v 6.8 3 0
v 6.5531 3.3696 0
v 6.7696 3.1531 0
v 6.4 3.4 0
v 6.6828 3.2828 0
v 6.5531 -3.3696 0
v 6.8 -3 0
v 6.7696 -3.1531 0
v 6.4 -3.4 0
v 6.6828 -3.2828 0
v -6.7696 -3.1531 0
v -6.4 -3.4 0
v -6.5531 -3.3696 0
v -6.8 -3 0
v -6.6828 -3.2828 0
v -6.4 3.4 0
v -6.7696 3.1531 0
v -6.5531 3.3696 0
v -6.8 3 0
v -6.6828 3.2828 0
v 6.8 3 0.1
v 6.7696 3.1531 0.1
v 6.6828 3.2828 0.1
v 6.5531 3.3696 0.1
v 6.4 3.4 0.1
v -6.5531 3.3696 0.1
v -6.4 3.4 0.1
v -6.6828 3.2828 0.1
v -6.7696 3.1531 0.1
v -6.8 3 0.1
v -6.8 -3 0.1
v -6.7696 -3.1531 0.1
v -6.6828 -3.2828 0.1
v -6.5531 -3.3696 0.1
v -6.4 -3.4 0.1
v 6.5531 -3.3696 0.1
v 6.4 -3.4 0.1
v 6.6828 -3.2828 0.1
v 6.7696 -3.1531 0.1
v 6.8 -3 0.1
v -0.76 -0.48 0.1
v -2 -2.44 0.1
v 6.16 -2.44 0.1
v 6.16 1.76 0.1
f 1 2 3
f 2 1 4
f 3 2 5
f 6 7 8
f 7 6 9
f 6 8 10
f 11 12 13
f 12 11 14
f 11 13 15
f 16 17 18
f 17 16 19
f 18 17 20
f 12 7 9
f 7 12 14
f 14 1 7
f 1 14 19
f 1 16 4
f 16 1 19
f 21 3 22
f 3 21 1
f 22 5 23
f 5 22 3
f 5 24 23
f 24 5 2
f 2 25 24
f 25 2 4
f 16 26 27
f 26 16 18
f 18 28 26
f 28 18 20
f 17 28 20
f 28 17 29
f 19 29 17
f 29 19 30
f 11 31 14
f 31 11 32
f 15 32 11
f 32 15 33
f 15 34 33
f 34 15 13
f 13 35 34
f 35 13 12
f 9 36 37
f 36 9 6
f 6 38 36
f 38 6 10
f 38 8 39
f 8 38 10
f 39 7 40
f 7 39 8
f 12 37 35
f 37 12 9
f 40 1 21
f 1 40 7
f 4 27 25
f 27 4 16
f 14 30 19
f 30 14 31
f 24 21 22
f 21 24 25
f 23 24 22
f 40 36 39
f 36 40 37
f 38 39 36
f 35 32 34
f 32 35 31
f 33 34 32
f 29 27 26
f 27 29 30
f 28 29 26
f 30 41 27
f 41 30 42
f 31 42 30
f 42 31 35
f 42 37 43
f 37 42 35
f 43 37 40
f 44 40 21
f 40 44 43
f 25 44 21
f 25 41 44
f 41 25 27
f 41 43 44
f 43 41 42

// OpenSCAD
// file: ../p/1-4cyli.scad
use <../lib.scad>
function ldraw_lib__1_4cyli() = [
// 0 Cylinder 0.25
// 0 Name: 1-4cyli.dat
// 0 Author: James Jessiman
// 0 !LDRAW_ORG Primitive UPDATE 2012-01
// 0 !LICENSE Licensed under CC BY 4.0 : see CAreadme.txt
// 
// 0 BFC CERTIFY CCW
  [0,"BFC","CERTIFY"],
  [0,"BFC","CCW"],
// 
// 0 !HISTORY 2002-03-23 [sbliss] Added BFC statement.
// 0 !HISTORY 2002-04-25 [PTadmin] Official Update 2002-02
// 0 !HISTORY 2007-06-22 [PTadmin] Header formatted for Contributor Agreement
// 0 !HISTORY 2008-07-01 [PTadmin] Official Update 2008-01
// 0 !HISTORY 2012-02-16 [Philo] Changed to CCW
// 0 !HISTORY 2012-03-30 [PTadmin] Official Update 2012-01
// 
// 
// 4 16 1 1 0 0.9239 1 0.3827 0.9239 0 0.3827 1 0 0
  [4,16,1,1,0,0.9239,1,0.3827,0.9239,0,0.3827,1,0,0],
// 5 24 1 0 0 1 1 0 0.9239 0 0.3827 1 0 -1
  [5,24,1,0,0,1,1,0,0.9239,0,0.3827,1,0,-1],
// 4 16 0.9239 1 0.3827 0.7071 1 0.7071 0.7071 0 0.7071 0.9239 0 0.3827
  [4,16,0.9239,1,0.3827,0.7071,1,0.7071,0.7071,0,0.7071,0.9239,0,0.3827],
// 5 24 0.9239 0 0.3827 0.9239 1 0.3827 0.7071 0 0.7071 1 0 0
  [5,24,0.9239,0,0.3827,0.9239,1,0.3827,0.7071,0,0.7071,1,0,0],
// 4 16 0.7071 1 0.7071 0.3827 1 0.9239 0.3827 0 0.9239 0.7071 0 0.7071
  [4,16,0.7071,1,0.7071,0.3827,1,0.9239,0.3827,0,0.9239,0.7071,0,0.7071],
// 5 24 0.7071 0 0.7071 0.7071 1 0.7071 0.3827 0 0.9239 0.9239 0 0.3827
  [5,24,0.7071,0,0.7071,0.7071,1,0.7071,0.3827,0,0.9239,0.9239,0,0.3827],
// 4 16 0.3827 1 0.9239 0 1 1 0 0 1 0.3827 0 0.9239
  [4,16,0.3827,1,0.9239,0,1,1,0,0,1,0.3827,0,0.9239],
// 5 24 0.3827 0 0.9239 0.3827 1 0.9239 0 0 1 0.7071 0 0.7071
  [5,24,0.3827,0,0.9239,0.3827,1,0.9239,0,0,1,0.7071,0,0.7071],
// 5 24 0 0 1 0 1 1 0.3827 0 0.9239 -1 0 1
  [5,24,0,0,1,0,1,1,0.3827,0,0.9239,-1,0,1],
];
module ldraw_lib__1_4cyli(step=0, col=false, unit=2/5, alt=false, line=0.2, solid=!$preview)
    makepoly(ldraw_lib__1_4cyli(), step=step, col=col, unit=unit, alt=alt, line=line, solid=solid);
ldraw_lib__1_4cyli(line=0.2);
// file: ../p/1-4chrd.scad
use <../lib.scad>
function ldraw_lib__1_4chrd() = [
// 0 Chord 0.25
// 0 Name: 1-4chrd.dat
// 0 Author: Max Martin Richter [MMR1988]
// 0 !LDRAW_ORG Primitive UPDATE 2023-05
// 0 !LICENSE Licensed under CC BY 4.0 : see CAreadme.txt
// 
// 0 BFC CERTIFY CCW
  [0,"BFC","CERTIFY"],
  [0,"BFC","CCW"],
// 
// 0 !HISTORY 2004-04-22 [PTadmin] Official Update 2004-02
// 0 !HISTORY 2007-10-09 [PTadmin] Header formatted for Contributor Agreement
// 0 !HISTORY 2008-07-01 [PTadmin] Official Update 2008-01
// 0 !HISTORY 2012-08-02 [MMR1988] Re-creation with PrimGen2 and Rectifier
// 0 !HISTORY 2012-08-09 [PTadmin] Official Update 2012-02
// 0 !HISTORY 2023-10-27 [OrionP] Change author to MMR1988 from hafhead
// 0 !HISTORY 2023-10-31 [OrionP] Official Update 2023-05
// 
// 4 16 0.9239 0 0.3827 0.3827 0 0.9239 0 0 1 1 0 0
  [4,16,0.9239,0,0.3827,0.3827,0,0.9239,0,0,1,1,0,0],
// 3 16 0.7071 0 0.7071 0.3827 0 0.9239 0.9239 0 0.3827
  [3,16,0.7071,0,0.7071,0.3827,0,0.9239,0.9239,0,0.3827],
];
module ldraw_lib__1_4chrd(step=0, col=false, unit=2/5, alt=false, line=0.2, solid=!$preview)
    makepoly(ldraw_lib__1_4chrd(), step=step, col=col, unit=unit, alt=alt, line=line, solid=solid);
ldraw_lib__1_4chrd(line=0.2);
// main file
use <../lib.scad>
use <../p/1-4chrd.scad>
use <../p/1-4cyli.scad>
function ldraw_lib__6347356g() = [
// 0 Sticker  0.8 x  1.7 with Bright Light Orange Trapezoid Short Left
// 0 Name: 6347356g.dat
// 0 Author: Evert-Jan Boer [ejboer]
// 0 !LDRAW_ORG Part UPDATE 2024-06
// 0 !LICENSE Licensed under CC BY 4.0 : see CAreadme.txt
// 
// 0 BFC CERTIFY CCW
  [0,"BFC","CERTIFY"],
  [0,"BFC","CCW"],
// 
// 0 !KEYWORDS Republic Gunship, Set 75309, Star Wars
// 
// 0 !HISTORY 2024-07-29 [OrionP] Official Update 2024-06
// 
// 1 16 16 0 7.5 1 0 0 0 -1 0 0 0 1 1-4chrd.dat
  [1,16,16,0,7.5,1,0,0,0,-1,0,0,0,1, ldraw_lib__1_4chrd()],
// 1 16 16 0 -7.5 0 0 1 0 -1 0 -1 0 0 1-4chrd.dat
  [1,16,16,0,-7.5,0,0,1,0,-1,0,-1,0,0, ldraw_lib__1_4chrd()],
// 1 16 -16 0 -7.5 -1 0 0 0 -1 0 0 0 -1 1-4chrd.dat
  [1,16,-16,0,-7.5,-1,0,0,0,-1,0,0,0,-1, ldraw_lib__1_4chrd()],
// 1 16 -16 0 7.5 0 0 -1 0 -1 0 1 0 0 1-4chrd.dat
  [1,16,-16,0,7.5,0,0,-1,0,-1,0,1,0,0, ldraw_lib__1_4chrd()],
// 4 16 16 0 -8.5 -16 0 -8.5 -17 0 -7.5 17 0 -7.5
  [4,16,16,0,-8.5,-16,0,-8.5,-17,0,-7.5,17,0,-7.5],
// 4 16 17 0 7.5 17 0 -7.5 -17 0 -7.5 -17 0 7.5
  [4,16,17,0,7.5,17,0,-7.5,-17,0,-7.5,-17,0,7.5],
// 4 16 17 0 7.5 -17 0 7.5 -16 0 8.5 16 0 8.5
  [4,16,17,0,7.5,-17,0,7.5,-16,0,8.5,16,0,8.5],
// 
// 1 16 16 -.25 7.5 1 0 0 0 .25 0 0 0 1 1-4cyli.dat
  [1,16,16,-.25,7.5,1,0,0,0,.25,0,0,0,1, ldraw_lib__1_4cyli()],
// 1 16 -16 -.25 7.5 0 0 -1 0 .25 0 1 0 0 1-4cyli.dat
  [1,16,-16,-.25,7.5,0,0,-1,0,.25,0,1,0,0, ldraw_lib__1_4cyli()],
// 1 16 -16 -.25 -7.5 -1 0 0 0 .25 0 0 0 -1 1-4cyli.dat
  [1,16,-16,-.25,-7.5,-1,0,0,0,.25,0,0,0,-1, ldraw_lib__1_4cyli()],
// 1 16 16 -.25 -7.5 0 0 1 0 .25 0 -1 0 0 1-4cyli.dat
  [1,16,16,-.25,-7.5,0,0,1,0,.25,0,-1,0,0, ldraw_lib__1_4cyli()],
// 4 16 16 -.25 -8.5 -16 -.25 -8.5 -16 0 -8.5 16 0 -8.5
  [4,16,16,-.25,-8.5,-16,-.25,-8.5,-16,0,-8.5,16,0,-8.5],
// 4 16 17 -.25 7.5 17 -.25 -7.5 17 0 -7.5 17 0 7.5
  [4,16,17,-.25,7.5,17,-.25,-7.5,17,0,-7.5,17,0,7.5],
// 4 16 -16 -.25 8.5 16 -.25 8.5 16 0 8.5 -16 0 8.5
  [4,16,-16,-.25,8.5,16,-.25,8.5,16,0,8.5,-16,0,8.5],
// 4 16 -17 -.25 -7.5 -17 -.25 7.5 -17 0 7.5 -17 0 -7.5
  [4,16,-17,-.25,-7.5,-17,-.25,7.5,-17,0,7.5,-17,0,-7.5],
// 
// 1 16 16 -.25 7.5 1 0 0 0 1 0 0 0 1 1-4chrd.dat
  [1,16,16,-.25,7.5,1,0,0,0,1,0,0,0,1, ldraw_lib__1_4chrd()],
// 1 16 16 -.25 -7.5 0 0 1 0 1 0 -1 0 0 1-4chrd.dat
  [1,16,16,-.25,-7.5,0,0,1,0,1,0,-1,0,0, ldraw_lib__1_4chrd()],
// 1 16 -16 -.25 -7.5 -1 0 0 0 1 0 0 0 -1 1-4chrd.dat
  [1,16,-16,-.25,-7.5,-1,0,0,0,1,0,0,0,-1, ldraw_lib__1_4chrd()],
// 1 16 -16 -.25 7.5 0 0 -1 0 1 0 1 0 0 1-4chrd.dat
  [1,16,-16,-.25,7.5,0,0,-1,0,1,0,1,0,0, ldraw_lib__1_4chrd()],
// 4 16 -16 -.25 8.5 -17 -.25 7.5 -5 -.25 -6.1 -1.9 -.25 -1.2
  [4,16,-16,-.25,8.5,-17,-.25,7.5,-5,-.25,-6.1,-1.9,-.25,-1.2],
// 4 16 -16 -.25 -8.5 -5 -.25 -6.1 -17 -.25 7.5 -17 -.25 -7.5
  [4,16,-16,-.25,-8.5,-5,-.25,-6.1,-17,-.25,7.5,-17,-.25,-7.5],
// 4 16 16 -.25 -8.5 15.4 -.25 -6.1 -5 -.25 -6.1 -16 -.25 -8.5
  [4,16,16,-.25,-8.5,15.4,-.25,-6.1,-5,-.25,-6.1,-16,-.25,-8.5],
// 3 16 15.4 -.25 -6.1 16 -.25 -8.5 17 -.25 -7.5
  [3,16,15.4,-.25,-6.1,16,-.25,-8.5,17,-.25,-7.5],
// 4 16 17 -.25 7.5 15.4 -.25 4.4 15.4 -.25 -6.1 17 -.25 -7.5
  [4,16,17,-.25,7.5,15.4,-.25,4.4,15.4,-.25,-6.1,17,-.25,-7.5],
// 3 16 16 -.25 8.5 15.4 -.25 4.4 17 -.25 7.5
  [3,16,16,-.25,8.5,15.4,-.25,4.4,17,-.25,7.5],
// 4 16 16 -.25 8.5 -16 -.25 8.5 -1.9 -.25 -1.2 15.4 -.25 4.4
  [4,16,16,-.25,8.5,-16,-.25,8.5,-1.9,-.25,-1.2,15.4,-.25,4.4],
// 
// 0 BFC NOCLIP
  [0,"BFC","NOCLIP"],
// 4 191 15.4 -.25 4.4 -1.9 -.25 -1.2 -5 -.25 -6.1 15.4 -.25 -6.1
  [4,191,15.4,-.25,4.4,-1.9,-.25,-1.2,-5,-.25,-6.1,15.4,-.25,-6.1],
];
module ldraw_lib__6347356g(step=0, col=false, unit=2/5, alt=false, line=0.2, solid=!$preview)
    makepoly(ldraw_lib__6347356g(), step=step, col=col, unit=unit, alt=alt, line=line, solid=solid);
ldraw_lib__6347356g(line=0.2);
